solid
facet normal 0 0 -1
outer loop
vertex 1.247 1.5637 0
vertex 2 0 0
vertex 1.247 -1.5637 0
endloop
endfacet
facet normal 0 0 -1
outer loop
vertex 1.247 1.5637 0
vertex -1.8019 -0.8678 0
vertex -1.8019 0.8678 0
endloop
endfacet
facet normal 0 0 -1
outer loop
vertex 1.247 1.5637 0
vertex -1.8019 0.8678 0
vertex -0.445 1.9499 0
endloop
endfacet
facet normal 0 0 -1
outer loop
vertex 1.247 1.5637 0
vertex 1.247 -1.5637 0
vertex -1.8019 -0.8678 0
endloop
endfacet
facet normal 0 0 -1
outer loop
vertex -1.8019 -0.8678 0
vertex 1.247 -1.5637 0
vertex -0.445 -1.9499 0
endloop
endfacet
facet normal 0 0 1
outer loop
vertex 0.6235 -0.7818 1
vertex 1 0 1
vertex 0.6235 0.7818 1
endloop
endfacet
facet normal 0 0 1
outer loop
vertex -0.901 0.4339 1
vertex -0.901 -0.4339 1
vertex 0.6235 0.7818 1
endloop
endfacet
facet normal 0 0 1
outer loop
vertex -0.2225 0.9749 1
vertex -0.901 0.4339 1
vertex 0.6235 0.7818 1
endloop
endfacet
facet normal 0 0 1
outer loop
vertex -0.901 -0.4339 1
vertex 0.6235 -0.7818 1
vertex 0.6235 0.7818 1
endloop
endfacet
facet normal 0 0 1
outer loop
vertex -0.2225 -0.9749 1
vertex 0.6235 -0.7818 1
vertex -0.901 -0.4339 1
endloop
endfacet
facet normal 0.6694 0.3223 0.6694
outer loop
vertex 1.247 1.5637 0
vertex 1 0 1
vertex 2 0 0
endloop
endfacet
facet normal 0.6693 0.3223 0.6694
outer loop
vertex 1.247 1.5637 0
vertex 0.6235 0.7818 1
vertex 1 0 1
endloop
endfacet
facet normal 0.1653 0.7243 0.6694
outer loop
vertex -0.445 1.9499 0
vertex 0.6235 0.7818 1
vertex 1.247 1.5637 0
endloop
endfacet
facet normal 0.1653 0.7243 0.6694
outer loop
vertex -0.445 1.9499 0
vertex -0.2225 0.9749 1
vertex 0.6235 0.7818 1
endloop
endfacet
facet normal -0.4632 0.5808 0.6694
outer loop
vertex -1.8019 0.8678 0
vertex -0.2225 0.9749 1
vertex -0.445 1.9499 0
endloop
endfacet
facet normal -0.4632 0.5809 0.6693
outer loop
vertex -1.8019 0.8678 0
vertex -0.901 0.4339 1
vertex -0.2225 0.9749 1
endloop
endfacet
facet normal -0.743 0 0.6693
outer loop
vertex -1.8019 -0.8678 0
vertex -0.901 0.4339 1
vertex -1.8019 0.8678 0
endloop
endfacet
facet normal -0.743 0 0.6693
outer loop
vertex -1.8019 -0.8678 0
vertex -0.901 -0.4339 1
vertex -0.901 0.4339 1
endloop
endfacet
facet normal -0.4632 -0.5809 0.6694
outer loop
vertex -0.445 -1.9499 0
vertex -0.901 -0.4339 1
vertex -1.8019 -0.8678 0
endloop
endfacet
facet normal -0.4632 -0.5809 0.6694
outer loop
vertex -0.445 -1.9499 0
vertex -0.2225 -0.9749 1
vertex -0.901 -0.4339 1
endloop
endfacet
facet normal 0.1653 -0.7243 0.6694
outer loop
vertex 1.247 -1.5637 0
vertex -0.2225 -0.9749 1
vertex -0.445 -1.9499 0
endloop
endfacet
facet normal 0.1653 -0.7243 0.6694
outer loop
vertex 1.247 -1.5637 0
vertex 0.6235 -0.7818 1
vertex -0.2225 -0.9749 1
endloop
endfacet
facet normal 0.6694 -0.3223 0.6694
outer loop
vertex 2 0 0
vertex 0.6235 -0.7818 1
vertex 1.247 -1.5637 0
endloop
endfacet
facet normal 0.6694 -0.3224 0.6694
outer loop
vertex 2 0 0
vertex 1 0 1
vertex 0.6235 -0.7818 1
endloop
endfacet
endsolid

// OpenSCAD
module base(r,h,$fn=$fn) {
    linear_extrude(h,scale = 0.5) {
        circle(r*2);
    }
}

base(1,1);
